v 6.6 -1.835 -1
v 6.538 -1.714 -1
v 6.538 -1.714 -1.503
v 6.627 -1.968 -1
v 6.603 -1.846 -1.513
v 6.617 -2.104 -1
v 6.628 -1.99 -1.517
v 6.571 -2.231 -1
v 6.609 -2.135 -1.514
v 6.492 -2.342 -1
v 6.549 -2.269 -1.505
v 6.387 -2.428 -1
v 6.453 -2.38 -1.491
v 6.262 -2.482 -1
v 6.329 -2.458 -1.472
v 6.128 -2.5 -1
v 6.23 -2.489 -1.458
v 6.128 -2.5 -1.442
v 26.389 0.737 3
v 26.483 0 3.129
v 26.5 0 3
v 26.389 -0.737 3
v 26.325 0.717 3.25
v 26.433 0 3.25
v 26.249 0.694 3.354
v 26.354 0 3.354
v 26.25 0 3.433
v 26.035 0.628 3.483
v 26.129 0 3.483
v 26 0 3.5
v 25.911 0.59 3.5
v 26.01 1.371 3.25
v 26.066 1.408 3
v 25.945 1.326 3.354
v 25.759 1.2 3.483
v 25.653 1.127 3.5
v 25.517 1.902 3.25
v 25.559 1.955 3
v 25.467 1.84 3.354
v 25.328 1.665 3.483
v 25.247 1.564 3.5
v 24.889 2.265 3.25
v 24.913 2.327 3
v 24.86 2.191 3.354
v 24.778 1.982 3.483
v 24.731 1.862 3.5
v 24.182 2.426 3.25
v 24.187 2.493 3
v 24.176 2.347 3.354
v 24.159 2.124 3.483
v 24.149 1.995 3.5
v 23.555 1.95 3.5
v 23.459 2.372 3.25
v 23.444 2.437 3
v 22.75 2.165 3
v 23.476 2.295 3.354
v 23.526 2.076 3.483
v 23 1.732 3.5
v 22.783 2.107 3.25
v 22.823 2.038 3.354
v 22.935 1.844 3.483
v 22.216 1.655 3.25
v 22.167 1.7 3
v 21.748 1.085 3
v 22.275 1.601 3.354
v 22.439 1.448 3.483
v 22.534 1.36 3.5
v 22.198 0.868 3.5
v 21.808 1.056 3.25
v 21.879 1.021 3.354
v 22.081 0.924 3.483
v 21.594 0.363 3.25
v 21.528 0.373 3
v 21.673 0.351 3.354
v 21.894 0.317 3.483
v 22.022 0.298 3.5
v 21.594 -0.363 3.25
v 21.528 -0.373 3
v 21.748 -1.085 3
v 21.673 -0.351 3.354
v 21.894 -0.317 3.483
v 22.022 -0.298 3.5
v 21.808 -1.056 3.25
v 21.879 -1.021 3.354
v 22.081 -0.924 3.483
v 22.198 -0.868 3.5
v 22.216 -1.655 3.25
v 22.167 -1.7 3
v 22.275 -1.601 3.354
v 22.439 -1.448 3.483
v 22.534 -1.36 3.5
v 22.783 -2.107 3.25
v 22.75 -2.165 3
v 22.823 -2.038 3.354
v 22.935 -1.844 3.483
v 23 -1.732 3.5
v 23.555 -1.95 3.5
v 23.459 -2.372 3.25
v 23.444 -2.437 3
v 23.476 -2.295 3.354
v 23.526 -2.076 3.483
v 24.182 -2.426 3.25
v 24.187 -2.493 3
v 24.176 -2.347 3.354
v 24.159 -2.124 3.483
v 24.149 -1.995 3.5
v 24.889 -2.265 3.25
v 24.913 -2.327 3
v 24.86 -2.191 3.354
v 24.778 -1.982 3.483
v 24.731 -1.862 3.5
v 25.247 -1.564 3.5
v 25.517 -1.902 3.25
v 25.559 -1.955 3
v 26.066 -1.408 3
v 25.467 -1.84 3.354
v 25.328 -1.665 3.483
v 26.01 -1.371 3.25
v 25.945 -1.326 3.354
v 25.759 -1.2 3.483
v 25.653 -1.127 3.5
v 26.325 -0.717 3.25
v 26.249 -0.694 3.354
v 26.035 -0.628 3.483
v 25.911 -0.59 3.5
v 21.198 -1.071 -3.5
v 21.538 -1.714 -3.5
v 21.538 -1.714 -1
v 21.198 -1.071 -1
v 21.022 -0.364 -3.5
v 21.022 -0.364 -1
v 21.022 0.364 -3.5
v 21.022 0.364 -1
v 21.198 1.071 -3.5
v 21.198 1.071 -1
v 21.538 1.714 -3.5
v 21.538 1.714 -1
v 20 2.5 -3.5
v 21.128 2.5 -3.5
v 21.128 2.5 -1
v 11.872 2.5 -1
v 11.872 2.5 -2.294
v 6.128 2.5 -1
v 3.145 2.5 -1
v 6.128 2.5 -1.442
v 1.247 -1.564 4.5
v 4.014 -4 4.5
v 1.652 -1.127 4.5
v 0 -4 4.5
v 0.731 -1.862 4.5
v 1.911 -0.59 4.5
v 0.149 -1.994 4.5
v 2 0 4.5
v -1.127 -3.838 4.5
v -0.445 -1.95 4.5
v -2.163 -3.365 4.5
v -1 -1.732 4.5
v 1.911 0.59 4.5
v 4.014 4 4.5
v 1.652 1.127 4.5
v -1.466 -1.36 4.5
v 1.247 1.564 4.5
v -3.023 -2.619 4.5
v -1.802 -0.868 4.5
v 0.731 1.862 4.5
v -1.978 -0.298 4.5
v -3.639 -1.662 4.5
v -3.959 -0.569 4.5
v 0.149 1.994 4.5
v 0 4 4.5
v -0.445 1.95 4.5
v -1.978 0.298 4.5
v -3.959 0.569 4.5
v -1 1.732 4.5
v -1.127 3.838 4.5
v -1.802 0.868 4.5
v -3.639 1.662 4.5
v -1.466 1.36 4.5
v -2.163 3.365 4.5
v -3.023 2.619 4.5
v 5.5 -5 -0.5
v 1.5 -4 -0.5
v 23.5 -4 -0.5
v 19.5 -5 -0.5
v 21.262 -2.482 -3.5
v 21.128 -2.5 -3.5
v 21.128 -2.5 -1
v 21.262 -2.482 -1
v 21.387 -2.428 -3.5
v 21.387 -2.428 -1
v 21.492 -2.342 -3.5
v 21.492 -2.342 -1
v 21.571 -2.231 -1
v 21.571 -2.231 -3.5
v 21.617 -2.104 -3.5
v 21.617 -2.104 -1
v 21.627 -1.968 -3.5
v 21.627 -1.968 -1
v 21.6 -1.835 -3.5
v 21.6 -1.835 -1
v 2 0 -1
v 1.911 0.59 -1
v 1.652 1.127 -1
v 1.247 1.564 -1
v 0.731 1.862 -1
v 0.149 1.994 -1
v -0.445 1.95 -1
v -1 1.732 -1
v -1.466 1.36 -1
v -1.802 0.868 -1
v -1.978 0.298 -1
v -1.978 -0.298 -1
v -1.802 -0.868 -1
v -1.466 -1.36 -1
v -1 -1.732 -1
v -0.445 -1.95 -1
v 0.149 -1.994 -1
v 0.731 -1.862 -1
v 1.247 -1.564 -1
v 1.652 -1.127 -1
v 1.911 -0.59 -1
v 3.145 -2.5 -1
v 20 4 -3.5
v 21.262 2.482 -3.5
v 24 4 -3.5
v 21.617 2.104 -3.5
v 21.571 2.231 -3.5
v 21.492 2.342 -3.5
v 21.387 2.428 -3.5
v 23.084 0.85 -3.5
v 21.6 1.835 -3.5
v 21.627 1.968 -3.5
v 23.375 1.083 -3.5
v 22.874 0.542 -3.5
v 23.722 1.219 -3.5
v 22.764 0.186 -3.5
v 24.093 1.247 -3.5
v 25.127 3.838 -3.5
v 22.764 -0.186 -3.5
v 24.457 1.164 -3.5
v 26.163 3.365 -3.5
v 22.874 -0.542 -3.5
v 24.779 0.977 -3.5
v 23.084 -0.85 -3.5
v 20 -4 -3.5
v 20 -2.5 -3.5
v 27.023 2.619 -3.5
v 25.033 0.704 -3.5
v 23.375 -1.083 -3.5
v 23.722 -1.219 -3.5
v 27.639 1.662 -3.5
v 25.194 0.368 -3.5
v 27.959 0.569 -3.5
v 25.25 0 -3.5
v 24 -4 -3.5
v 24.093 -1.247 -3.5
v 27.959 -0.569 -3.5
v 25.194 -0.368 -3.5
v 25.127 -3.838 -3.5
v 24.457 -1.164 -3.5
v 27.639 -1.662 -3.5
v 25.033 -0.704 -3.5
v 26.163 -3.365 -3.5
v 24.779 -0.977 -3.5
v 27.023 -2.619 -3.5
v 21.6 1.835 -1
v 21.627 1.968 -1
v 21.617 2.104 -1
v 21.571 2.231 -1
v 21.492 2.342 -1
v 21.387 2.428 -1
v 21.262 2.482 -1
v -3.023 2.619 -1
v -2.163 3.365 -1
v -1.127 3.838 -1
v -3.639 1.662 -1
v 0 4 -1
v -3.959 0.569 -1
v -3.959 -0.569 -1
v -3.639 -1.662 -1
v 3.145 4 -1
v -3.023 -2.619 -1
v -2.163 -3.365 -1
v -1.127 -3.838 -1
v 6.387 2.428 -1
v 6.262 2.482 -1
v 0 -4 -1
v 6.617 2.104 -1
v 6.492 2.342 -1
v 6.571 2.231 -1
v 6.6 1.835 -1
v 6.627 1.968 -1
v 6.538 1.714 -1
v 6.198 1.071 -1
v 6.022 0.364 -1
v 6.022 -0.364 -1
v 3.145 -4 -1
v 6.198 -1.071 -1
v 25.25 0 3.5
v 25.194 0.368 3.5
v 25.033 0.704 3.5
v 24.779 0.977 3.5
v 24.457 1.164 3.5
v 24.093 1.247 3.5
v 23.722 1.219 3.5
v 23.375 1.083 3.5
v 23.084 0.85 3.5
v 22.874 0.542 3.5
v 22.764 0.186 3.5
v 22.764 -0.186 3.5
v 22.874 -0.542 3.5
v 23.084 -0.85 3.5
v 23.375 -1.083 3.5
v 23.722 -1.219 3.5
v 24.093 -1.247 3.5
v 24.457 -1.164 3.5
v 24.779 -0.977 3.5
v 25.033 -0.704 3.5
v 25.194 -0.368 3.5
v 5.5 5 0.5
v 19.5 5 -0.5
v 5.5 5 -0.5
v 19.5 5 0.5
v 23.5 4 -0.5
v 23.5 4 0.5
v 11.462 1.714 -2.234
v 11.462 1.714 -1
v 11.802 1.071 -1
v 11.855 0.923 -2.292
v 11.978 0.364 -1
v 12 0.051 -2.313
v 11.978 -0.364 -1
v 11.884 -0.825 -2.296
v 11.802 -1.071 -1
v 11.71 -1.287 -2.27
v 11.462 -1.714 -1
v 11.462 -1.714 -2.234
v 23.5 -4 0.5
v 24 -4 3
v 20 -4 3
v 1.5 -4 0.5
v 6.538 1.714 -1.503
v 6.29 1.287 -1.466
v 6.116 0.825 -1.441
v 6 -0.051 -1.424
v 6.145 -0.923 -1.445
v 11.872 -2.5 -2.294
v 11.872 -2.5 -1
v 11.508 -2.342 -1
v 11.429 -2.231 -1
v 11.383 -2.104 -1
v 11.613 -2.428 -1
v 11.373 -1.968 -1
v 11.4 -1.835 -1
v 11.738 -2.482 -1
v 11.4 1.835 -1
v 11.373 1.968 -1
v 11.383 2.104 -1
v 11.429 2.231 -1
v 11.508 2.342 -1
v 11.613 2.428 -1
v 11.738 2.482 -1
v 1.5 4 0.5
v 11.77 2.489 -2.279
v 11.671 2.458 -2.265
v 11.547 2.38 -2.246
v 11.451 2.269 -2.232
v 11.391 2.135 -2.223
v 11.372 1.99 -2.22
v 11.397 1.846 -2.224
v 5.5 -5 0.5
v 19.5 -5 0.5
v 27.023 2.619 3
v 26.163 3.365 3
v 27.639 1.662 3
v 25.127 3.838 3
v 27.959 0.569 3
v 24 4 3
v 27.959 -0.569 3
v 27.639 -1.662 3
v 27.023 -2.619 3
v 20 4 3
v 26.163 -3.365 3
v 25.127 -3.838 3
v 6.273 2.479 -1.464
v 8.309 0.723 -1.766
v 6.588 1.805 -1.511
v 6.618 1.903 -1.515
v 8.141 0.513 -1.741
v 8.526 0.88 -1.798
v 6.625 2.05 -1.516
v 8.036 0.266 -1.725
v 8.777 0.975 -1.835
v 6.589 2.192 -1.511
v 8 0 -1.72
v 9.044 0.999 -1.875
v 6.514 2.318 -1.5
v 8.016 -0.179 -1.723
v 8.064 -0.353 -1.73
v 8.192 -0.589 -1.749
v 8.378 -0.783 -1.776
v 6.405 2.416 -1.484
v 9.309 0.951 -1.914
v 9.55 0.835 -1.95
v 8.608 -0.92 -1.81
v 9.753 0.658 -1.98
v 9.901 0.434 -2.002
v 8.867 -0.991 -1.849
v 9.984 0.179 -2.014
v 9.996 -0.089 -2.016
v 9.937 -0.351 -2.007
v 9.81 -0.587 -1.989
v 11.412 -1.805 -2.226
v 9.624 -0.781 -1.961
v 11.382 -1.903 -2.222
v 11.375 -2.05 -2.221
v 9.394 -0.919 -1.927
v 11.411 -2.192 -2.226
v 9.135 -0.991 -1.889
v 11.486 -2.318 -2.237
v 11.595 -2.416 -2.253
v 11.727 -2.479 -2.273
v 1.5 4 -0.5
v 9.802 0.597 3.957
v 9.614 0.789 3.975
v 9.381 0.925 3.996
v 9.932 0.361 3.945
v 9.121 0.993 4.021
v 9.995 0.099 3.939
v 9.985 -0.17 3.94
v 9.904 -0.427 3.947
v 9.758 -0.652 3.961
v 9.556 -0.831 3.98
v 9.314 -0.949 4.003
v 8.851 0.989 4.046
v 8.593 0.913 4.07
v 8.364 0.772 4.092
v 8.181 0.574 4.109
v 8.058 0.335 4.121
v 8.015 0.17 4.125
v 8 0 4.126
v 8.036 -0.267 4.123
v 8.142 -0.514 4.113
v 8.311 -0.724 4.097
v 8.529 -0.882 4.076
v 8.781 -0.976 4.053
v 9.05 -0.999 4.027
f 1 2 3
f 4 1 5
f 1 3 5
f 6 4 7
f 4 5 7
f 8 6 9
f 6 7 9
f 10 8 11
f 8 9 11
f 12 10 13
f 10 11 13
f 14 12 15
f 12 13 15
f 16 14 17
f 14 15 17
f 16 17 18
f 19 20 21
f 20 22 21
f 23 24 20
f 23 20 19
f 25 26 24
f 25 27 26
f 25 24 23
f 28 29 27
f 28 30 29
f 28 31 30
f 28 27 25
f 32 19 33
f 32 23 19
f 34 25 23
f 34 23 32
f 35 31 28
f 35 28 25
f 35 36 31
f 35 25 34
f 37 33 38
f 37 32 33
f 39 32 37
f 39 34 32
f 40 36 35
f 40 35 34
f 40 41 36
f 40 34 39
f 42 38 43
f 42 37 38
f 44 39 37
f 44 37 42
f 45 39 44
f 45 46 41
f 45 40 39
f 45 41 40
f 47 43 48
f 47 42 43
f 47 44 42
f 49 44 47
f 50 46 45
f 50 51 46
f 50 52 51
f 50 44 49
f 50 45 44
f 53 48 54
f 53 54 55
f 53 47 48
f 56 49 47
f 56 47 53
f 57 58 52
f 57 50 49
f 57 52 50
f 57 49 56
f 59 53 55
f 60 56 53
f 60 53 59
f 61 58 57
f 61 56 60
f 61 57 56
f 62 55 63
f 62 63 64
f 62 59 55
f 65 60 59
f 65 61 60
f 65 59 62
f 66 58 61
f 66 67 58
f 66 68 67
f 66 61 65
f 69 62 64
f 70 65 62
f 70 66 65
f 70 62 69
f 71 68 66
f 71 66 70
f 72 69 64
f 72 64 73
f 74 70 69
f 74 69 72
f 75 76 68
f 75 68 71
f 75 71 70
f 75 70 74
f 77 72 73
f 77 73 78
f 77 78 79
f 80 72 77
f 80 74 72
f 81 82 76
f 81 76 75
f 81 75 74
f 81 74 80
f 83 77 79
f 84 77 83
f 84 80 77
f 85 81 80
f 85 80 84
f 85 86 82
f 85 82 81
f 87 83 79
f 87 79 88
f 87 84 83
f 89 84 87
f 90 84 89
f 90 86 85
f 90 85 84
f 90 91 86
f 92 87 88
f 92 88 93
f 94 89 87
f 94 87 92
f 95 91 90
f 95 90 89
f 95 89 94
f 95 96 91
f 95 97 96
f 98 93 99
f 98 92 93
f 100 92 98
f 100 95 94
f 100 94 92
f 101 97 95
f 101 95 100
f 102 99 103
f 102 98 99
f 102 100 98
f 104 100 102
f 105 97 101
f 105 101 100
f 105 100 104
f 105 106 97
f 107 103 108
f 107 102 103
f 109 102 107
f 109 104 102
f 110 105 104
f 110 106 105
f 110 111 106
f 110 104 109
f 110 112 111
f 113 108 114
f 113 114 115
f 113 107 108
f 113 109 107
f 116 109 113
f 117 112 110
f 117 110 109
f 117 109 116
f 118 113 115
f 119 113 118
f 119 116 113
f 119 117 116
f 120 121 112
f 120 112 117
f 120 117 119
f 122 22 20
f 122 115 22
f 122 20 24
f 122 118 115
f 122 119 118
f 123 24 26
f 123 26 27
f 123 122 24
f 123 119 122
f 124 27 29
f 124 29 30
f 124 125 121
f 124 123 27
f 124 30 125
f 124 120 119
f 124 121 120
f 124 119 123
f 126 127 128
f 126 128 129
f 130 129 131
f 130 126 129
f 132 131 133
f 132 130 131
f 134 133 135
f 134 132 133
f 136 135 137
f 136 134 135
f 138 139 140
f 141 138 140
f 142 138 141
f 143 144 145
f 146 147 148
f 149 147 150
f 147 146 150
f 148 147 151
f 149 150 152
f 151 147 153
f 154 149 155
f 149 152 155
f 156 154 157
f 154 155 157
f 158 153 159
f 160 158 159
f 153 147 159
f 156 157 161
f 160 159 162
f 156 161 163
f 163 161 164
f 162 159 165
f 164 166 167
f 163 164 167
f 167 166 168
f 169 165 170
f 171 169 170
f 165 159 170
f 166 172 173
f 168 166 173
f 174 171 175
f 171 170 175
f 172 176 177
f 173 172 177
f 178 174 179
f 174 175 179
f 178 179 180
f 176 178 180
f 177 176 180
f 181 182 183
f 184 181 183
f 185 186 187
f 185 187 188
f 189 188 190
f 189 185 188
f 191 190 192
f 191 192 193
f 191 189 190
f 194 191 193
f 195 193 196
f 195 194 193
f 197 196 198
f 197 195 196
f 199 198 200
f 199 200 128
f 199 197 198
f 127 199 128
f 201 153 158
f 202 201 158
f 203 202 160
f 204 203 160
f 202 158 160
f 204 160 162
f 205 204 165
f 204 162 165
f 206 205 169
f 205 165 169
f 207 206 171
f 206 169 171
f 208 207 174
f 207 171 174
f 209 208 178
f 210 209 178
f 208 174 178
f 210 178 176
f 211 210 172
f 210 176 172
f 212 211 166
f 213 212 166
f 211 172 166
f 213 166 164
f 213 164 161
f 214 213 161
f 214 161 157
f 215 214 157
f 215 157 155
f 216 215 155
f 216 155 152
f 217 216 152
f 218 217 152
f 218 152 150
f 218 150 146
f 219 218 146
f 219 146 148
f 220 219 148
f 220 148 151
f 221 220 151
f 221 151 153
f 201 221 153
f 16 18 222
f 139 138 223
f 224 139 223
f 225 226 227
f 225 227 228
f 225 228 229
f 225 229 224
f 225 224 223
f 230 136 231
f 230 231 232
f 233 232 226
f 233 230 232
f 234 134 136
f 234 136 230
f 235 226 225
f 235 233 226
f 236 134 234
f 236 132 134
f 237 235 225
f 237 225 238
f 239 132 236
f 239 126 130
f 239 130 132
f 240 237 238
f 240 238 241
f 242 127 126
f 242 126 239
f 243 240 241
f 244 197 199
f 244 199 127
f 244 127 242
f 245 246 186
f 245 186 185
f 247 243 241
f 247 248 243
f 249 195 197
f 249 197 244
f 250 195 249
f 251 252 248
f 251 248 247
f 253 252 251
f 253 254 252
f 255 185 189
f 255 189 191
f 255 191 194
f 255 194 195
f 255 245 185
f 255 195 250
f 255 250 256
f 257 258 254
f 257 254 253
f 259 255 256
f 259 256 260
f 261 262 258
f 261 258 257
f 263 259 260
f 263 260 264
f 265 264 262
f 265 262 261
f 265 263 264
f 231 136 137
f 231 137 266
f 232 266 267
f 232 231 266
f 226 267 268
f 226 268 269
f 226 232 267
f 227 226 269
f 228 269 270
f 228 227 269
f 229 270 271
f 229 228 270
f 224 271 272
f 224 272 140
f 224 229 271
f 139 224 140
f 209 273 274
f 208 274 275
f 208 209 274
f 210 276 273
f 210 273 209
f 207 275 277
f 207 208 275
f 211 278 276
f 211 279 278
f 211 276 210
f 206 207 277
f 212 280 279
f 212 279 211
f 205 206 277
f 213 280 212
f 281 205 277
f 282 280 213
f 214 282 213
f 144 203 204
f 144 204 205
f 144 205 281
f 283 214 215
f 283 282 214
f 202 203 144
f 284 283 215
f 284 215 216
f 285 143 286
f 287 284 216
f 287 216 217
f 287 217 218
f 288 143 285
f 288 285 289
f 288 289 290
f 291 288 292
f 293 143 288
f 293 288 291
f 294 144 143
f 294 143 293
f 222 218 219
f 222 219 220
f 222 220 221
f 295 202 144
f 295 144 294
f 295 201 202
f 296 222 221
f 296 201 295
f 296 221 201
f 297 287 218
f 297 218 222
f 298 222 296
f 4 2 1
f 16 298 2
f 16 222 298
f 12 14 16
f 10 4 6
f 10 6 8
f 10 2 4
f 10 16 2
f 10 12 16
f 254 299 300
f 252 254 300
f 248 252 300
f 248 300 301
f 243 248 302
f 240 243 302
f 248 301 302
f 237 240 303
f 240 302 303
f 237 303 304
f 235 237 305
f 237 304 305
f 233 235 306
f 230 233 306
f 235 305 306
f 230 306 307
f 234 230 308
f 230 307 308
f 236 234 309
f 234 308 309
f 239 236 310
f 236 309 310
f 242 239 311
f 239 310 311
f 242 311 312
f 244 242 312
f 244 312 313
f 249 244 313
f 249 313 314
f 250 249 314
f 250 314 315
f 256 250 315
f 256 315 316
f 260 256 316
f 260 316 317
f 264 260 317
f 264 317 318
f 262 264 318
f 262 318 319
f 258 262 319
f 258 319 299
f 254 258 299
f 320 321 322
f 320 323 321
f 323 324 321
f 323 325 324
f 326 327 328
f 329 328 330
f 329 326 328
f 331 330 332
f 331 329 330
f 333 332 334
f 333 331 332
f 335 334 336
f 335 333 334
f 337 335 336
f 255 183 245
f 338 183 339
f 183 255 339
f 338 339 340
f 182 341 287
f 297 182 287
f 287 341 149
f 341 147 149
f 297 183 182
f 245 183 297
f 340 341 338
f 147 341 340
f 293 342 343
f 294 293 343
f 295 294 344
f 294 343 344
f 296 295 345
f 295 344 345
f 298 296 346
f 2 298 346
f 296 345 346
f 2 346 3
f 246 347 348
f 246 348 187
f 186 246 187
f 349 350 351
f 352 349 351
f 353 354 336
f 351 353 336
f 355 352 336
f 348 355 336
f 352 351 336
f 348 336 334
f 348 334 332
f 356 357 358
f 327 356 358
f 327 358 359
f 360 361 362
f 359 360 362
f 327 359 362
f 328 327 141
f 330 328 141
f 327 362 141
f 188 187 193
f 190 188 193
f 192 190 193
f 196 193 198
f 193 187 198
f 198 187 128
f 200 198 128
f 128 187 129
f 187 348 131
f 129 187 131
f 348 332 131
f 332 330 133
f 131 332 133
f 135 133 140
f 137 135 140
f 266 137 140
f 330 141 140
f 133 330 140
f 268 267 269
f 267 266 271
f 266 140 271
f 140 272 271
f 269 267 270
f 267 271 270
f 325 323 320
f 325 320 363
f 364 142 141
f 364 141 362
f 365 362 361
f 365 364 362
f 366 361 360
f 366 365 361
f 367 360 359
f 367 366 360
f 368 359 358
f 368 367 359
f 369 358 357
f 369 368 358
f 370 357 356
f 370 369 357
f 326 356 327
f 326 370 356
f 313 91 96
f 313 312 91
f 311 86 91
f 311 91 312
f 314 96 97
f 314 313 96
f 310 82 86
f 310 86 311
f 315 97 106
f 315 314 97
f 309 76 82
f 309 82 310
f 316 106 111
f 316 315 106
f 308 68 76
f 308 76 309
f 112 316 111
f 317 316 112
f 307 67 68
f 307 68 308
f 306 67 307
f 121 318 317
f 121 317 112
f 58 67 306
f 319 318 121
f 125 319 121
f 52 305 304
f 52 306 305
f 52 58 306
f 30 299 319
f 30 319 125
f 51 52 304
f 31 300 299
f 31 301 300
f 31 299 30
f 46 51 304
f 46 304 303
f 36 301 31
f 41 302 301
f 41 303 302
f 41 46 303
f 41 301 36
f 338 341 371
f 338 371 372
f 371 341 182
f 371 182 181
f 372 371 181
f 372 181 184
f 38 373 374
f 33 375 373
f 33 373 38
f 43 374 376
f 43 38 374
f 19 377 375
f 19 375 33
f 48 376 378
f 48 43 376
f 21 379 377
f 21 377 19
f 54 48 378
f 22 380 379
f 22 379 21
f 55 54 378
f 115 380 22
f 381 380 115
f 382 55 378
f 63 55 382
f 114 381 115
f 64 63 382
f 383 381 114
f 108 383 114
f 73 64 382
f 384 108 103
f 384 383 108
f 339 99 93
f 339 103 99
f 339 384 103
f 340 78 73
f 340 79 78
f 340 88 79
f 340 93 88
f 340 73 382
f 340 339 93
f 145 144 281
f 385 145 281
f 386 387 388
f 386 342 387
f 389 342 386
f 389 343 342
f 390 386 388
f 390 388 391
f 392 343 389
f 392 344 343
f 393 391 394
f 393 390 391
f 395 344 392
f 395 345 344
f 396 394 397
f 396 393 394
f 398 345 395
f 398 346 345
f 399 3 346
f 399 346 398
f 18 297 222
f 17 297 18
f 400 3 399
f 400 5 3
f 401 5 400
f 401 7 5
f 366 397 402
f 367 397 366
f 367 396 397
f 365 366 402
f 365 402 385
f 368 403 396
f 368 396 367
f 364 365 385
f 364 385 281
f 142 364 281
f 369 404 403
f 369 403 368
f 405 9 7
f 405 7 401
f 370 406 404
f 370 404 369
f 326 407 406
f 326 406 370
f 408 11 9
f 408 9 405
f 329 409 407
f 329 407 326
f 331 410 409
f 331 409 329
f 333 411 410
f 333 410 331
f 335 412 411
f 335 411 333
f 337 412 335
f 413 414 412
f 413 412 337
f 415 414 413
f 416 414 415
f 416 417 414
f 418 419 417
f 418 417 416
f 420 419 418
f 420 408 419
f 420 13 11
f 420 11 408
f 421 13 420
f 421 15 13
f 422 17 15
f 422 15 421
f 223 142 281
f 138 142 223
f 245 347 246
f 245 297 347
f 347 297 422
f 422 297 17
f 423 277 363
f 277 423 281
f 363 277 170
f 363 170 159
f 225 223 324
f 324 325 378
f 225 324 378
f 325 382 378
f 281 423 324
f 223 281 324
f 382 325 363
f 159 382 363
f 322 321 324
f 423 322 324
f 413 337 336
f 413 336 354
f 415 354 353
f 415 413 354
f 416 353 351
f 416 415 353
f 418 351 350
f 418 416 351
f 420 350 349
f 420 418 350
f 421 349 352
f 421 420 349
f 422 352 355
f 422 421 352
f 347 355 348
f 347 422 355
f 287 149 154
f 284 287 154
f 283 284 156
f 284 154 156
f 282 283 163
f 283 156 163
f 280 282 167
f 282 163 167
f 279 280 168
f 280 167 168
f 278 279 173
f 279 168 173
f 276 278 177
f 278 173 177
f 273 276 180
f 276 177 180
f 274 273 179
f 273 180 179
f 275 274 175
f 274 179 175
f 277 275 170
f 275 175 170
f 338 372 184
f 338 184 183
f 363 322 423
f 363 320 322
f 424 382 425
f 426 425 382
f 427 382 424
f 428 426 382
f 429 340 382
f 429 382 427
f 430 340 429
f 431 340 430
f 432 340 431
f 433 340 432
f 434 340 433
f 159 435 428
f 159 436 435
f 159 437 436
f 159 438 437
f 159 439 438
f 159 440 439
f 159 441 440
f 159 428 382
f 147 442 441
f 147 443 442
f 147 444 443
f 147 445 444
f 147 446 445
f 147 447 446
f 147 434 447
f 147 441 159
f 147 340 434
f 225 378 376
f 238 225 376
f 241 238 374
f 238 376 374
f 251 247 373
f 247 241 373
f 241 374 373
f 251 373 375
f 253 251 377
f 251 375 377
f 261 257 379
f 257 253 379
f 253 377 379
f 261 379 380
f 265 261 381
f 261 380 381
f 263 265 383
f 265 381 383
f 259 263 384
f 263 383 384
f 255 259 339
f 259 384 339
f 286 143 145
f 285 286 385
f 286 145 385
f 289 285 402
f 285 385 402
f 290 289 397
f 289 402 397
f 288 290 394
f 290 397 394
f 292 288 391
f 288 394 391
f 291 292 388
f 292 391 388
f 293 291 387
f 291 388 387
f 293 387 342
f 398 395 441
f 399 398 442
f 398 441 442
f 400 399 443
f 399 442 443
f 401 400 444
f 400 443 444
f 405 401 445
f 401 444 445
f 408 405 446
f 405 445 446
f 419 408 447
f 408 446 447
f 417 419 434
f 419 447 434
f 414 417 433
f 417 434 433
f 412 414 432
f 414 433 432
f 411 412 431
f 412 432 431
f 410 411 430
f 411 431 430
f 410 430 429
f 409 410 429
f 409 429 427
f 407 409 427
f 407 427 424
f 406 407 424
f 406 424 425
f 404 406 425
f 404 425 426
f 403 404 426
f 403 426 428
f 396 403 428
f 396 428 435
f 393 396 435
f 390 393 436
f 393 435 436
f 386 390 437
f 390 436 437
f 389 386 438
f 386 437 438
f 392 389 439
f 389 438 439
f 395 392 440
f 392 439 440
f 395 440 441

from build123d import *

# Parameters (mm, degrees)
BASE_EXTRUSION_DEPTH    = 4.5
BOSS_EXTRU_1_DEPTH      = 0.5
ENL_V_MAT_EXTRU_1_DEPTH = 30.753151094
ENL_V_MAT_EXTRU_2_DEPTH = 30.753151094
ESQUISSE5_R             = 1.25
ESQUISSE5_R_2           = 1
ENL_V_MAT_EXTRU_3_DEPTH = 30.546573405
ESQUISSE11_R            = 2.5
BOSS_EXTRU_2_DEPTH      = 0.5
CONG_1_R                = 0.5
ESQUISSE12_R            = 1.25
ENL_V_MAT_EXTRU_5_DEPTH = 30.291637032
ESQUISSE13_R            = 2
ENL_V_MAT_EXTRU_6_DEPTH = 30.546573405
ENL_V_MAT_EXTRU_7_DEPTH = 2.5


with BuildPart() as part:
    # Esquisse1 → Base-Extrusion (new, symmetric)
    with BuildSketch(Plane.XY):
        with BuildLine():
            Line((0, 4), (24, 4))
            ThreePointArc((24, 4), (28, 0), (24, -4))
            Line((24, -4), (0, -4))
            ThreePointArc((0, -4), (-4, 0), (0, 4))
        make_face()
    extrude(amount=BASE_EXTRUSION_DEPTH, both=True)

    # Esquisse2 → Boss.-Extru.1 (add, symmetric)
    with BuildSketch(Plane.XY):
        Polygon((5.5, 5), (1.5, 4), (1.5, -4), (5.5, -5), (19.5, -5), (23.5, -4), (23.5, 4), (19.5, 5), align=None)
    extrude(amount=BOSS_EXTRU_1_DEPTH, both=True)

    # Esquisse3 → Enlèv. mat.-Extru.1 (cut, through all)
    with BuildSketch(Plane.XZ.offset(4)):
        Polygon((29, 3), (20, 3), (4.013550136, 4.5), (-6, 4.5), (-6, 6), (29, 6), align=None)
    extrude(amount=-ENL_V_MAT_EXTRU_1_DEPTH, mode=Mode.SUBTRACT)

    # Esquisse4 → Enlèv. mat.-Extru.2 (cut, through all)
    with BuildSketch(Plane.XZ.offset(4)):
        Polygon((-6, -1), (3.145079466, -1), (20, -3.5), (29.207616232, -3.5), (29.207616232, -4.5), (29.207616232, -7.5), (-6, -7.5), align=None)
    extrude(amount=-ENL_V_MAT_EXTRU_2_DEPTH, mode=Mode.SUBTRACT)

    # Esquisse5 → Enlèv. mat.-Extru.3 (cut, through all)
    with BuildSketch(Plane.XY.offset(4.5)):
        with Locations((24, 0)):
            Circle(ESQUISSE5_R)
        with Locations(Location((9, 0, 0), (0, 0, 180))):
            Circle(ESQUISSE5_R_2)
    extrude(amount=-ENL_V_MAT_EXTRU_3_DEPTH, mode=Mode.SUBTRACT)

    # Esquisse11 → Boss.-Extru.2 (add)
    with BuildSketch(Plane.XY.offset(3)):
        with Locations((24, 0)):
            Circle(ESQUISSE11_R)
    extrude(amount=BOSS_EXTRU_2_DEPTH)

    # Congé1
    cong_1_edges = [part.edges().sort_by_distance(p)[0] for p in [
        (21.5, 0, 3.5),
    ]]
    fillet(cong_1_edges, radius=CONG_1_R - 0.0001)  # a hair under: the kernel refuses the full size

    # Esquisse12 → Enlèv. mat.-Extru.5 (cut, through all)
    with BuildSketch(Plane.XY.offset(3.5)):
        with Locations((24, 0)):
            Circle(ESQUISSE12_R)
    extrude(amount=-ENL_V_MAT_EXTRU_5_DEPTH, mode=Mode.SUBTRACT)

    # Esquisse13 → Enlèv. mat.-Extru.6 (cut, through all)
    with BuildSketch(Plane.XY.offset(4.5)):
        Circle(ESQUISSE13_R)
    extrude(amount=-ENL_V_MAT_EXTRU_6_DEPTH, mode=Mode.SUBTRACT)

    # Esquisse14 → Enlèv. mat.-Extru.7 (cut)
    with BuildSketch(Plane(origin=(0, 0, -3.5), x_dir=(-1, 0, 0), z_dir=(0, 0, -1))):
        with BuildLine():
            Line((-2.872281323, 2.5), (-6.127718677, 2.5))
            ThreePointArc((-6.127718677, 2.5), (-6.570921307, 2.231455025), (-6.53804458, 1.714285714))
            ThreePointArc((-6.53804458, 1.714285714), (-6, 0), (-6.53804458, -1.714285714))
            ThreePointArc((-6.53804458, -1.714285714), (-6.570921307, -2.231455025), (-6.127718677, -2.5))
            Line((-6.127718677, -2.5), (-2.872281323, -2.5))
            ThreePointArc((-2.872281323, -2.5), (-2.429078693, -2.231455025), (-2.46195542, -1.714285714))
            ThreePointArc((-2.46195542, -1.714285714), (-3, 0), (-2.46195542, 1.714285714))
            ThreePointArc((-2.46195542, 1.714285714), (-2.429078693, 2.231455025), (-2.872281323, 2.5))
        make_face()
        with BuildLine():
            Line((-11.872281323, -2.5), (-21.127718677, -2.5))
            ThreePointArc((-21.127718677, -2.5), (-21.570921307, -2.231455025), (-21.53804458, -1.714285714))
            ThreePointArc((-21.53804458, -1.714285714), (-21, 0), (-21.53804458, 1.714285714))
            ThreePointArc((-21.53804458, 1.714285714), (-21.570921307, 2.231455025), (-21.127718677, 2.5))
            Line((-21.127718677, 2.5), (-11.872281323, 2.5))
            ThreePointArc((-11.872281323, 2.5), (-11.429078693, 2.231455025), (-11.46195542, 1.714285714))
            ThreePointArc((-11.46195542, 1.714285714), (-12, 0), (-11.46195542, -1.714285714))
            ThreePointArc((-11.46195542, -1.714285714), (-11.429078693, -2.231455025), (-11.872281323, -2.5))
        make_face()
    extrude(amount=-ENL_V_MAT_EXTRU_7_DEPTH, mode=Mode.SUBTRACT)


solid = part.part
